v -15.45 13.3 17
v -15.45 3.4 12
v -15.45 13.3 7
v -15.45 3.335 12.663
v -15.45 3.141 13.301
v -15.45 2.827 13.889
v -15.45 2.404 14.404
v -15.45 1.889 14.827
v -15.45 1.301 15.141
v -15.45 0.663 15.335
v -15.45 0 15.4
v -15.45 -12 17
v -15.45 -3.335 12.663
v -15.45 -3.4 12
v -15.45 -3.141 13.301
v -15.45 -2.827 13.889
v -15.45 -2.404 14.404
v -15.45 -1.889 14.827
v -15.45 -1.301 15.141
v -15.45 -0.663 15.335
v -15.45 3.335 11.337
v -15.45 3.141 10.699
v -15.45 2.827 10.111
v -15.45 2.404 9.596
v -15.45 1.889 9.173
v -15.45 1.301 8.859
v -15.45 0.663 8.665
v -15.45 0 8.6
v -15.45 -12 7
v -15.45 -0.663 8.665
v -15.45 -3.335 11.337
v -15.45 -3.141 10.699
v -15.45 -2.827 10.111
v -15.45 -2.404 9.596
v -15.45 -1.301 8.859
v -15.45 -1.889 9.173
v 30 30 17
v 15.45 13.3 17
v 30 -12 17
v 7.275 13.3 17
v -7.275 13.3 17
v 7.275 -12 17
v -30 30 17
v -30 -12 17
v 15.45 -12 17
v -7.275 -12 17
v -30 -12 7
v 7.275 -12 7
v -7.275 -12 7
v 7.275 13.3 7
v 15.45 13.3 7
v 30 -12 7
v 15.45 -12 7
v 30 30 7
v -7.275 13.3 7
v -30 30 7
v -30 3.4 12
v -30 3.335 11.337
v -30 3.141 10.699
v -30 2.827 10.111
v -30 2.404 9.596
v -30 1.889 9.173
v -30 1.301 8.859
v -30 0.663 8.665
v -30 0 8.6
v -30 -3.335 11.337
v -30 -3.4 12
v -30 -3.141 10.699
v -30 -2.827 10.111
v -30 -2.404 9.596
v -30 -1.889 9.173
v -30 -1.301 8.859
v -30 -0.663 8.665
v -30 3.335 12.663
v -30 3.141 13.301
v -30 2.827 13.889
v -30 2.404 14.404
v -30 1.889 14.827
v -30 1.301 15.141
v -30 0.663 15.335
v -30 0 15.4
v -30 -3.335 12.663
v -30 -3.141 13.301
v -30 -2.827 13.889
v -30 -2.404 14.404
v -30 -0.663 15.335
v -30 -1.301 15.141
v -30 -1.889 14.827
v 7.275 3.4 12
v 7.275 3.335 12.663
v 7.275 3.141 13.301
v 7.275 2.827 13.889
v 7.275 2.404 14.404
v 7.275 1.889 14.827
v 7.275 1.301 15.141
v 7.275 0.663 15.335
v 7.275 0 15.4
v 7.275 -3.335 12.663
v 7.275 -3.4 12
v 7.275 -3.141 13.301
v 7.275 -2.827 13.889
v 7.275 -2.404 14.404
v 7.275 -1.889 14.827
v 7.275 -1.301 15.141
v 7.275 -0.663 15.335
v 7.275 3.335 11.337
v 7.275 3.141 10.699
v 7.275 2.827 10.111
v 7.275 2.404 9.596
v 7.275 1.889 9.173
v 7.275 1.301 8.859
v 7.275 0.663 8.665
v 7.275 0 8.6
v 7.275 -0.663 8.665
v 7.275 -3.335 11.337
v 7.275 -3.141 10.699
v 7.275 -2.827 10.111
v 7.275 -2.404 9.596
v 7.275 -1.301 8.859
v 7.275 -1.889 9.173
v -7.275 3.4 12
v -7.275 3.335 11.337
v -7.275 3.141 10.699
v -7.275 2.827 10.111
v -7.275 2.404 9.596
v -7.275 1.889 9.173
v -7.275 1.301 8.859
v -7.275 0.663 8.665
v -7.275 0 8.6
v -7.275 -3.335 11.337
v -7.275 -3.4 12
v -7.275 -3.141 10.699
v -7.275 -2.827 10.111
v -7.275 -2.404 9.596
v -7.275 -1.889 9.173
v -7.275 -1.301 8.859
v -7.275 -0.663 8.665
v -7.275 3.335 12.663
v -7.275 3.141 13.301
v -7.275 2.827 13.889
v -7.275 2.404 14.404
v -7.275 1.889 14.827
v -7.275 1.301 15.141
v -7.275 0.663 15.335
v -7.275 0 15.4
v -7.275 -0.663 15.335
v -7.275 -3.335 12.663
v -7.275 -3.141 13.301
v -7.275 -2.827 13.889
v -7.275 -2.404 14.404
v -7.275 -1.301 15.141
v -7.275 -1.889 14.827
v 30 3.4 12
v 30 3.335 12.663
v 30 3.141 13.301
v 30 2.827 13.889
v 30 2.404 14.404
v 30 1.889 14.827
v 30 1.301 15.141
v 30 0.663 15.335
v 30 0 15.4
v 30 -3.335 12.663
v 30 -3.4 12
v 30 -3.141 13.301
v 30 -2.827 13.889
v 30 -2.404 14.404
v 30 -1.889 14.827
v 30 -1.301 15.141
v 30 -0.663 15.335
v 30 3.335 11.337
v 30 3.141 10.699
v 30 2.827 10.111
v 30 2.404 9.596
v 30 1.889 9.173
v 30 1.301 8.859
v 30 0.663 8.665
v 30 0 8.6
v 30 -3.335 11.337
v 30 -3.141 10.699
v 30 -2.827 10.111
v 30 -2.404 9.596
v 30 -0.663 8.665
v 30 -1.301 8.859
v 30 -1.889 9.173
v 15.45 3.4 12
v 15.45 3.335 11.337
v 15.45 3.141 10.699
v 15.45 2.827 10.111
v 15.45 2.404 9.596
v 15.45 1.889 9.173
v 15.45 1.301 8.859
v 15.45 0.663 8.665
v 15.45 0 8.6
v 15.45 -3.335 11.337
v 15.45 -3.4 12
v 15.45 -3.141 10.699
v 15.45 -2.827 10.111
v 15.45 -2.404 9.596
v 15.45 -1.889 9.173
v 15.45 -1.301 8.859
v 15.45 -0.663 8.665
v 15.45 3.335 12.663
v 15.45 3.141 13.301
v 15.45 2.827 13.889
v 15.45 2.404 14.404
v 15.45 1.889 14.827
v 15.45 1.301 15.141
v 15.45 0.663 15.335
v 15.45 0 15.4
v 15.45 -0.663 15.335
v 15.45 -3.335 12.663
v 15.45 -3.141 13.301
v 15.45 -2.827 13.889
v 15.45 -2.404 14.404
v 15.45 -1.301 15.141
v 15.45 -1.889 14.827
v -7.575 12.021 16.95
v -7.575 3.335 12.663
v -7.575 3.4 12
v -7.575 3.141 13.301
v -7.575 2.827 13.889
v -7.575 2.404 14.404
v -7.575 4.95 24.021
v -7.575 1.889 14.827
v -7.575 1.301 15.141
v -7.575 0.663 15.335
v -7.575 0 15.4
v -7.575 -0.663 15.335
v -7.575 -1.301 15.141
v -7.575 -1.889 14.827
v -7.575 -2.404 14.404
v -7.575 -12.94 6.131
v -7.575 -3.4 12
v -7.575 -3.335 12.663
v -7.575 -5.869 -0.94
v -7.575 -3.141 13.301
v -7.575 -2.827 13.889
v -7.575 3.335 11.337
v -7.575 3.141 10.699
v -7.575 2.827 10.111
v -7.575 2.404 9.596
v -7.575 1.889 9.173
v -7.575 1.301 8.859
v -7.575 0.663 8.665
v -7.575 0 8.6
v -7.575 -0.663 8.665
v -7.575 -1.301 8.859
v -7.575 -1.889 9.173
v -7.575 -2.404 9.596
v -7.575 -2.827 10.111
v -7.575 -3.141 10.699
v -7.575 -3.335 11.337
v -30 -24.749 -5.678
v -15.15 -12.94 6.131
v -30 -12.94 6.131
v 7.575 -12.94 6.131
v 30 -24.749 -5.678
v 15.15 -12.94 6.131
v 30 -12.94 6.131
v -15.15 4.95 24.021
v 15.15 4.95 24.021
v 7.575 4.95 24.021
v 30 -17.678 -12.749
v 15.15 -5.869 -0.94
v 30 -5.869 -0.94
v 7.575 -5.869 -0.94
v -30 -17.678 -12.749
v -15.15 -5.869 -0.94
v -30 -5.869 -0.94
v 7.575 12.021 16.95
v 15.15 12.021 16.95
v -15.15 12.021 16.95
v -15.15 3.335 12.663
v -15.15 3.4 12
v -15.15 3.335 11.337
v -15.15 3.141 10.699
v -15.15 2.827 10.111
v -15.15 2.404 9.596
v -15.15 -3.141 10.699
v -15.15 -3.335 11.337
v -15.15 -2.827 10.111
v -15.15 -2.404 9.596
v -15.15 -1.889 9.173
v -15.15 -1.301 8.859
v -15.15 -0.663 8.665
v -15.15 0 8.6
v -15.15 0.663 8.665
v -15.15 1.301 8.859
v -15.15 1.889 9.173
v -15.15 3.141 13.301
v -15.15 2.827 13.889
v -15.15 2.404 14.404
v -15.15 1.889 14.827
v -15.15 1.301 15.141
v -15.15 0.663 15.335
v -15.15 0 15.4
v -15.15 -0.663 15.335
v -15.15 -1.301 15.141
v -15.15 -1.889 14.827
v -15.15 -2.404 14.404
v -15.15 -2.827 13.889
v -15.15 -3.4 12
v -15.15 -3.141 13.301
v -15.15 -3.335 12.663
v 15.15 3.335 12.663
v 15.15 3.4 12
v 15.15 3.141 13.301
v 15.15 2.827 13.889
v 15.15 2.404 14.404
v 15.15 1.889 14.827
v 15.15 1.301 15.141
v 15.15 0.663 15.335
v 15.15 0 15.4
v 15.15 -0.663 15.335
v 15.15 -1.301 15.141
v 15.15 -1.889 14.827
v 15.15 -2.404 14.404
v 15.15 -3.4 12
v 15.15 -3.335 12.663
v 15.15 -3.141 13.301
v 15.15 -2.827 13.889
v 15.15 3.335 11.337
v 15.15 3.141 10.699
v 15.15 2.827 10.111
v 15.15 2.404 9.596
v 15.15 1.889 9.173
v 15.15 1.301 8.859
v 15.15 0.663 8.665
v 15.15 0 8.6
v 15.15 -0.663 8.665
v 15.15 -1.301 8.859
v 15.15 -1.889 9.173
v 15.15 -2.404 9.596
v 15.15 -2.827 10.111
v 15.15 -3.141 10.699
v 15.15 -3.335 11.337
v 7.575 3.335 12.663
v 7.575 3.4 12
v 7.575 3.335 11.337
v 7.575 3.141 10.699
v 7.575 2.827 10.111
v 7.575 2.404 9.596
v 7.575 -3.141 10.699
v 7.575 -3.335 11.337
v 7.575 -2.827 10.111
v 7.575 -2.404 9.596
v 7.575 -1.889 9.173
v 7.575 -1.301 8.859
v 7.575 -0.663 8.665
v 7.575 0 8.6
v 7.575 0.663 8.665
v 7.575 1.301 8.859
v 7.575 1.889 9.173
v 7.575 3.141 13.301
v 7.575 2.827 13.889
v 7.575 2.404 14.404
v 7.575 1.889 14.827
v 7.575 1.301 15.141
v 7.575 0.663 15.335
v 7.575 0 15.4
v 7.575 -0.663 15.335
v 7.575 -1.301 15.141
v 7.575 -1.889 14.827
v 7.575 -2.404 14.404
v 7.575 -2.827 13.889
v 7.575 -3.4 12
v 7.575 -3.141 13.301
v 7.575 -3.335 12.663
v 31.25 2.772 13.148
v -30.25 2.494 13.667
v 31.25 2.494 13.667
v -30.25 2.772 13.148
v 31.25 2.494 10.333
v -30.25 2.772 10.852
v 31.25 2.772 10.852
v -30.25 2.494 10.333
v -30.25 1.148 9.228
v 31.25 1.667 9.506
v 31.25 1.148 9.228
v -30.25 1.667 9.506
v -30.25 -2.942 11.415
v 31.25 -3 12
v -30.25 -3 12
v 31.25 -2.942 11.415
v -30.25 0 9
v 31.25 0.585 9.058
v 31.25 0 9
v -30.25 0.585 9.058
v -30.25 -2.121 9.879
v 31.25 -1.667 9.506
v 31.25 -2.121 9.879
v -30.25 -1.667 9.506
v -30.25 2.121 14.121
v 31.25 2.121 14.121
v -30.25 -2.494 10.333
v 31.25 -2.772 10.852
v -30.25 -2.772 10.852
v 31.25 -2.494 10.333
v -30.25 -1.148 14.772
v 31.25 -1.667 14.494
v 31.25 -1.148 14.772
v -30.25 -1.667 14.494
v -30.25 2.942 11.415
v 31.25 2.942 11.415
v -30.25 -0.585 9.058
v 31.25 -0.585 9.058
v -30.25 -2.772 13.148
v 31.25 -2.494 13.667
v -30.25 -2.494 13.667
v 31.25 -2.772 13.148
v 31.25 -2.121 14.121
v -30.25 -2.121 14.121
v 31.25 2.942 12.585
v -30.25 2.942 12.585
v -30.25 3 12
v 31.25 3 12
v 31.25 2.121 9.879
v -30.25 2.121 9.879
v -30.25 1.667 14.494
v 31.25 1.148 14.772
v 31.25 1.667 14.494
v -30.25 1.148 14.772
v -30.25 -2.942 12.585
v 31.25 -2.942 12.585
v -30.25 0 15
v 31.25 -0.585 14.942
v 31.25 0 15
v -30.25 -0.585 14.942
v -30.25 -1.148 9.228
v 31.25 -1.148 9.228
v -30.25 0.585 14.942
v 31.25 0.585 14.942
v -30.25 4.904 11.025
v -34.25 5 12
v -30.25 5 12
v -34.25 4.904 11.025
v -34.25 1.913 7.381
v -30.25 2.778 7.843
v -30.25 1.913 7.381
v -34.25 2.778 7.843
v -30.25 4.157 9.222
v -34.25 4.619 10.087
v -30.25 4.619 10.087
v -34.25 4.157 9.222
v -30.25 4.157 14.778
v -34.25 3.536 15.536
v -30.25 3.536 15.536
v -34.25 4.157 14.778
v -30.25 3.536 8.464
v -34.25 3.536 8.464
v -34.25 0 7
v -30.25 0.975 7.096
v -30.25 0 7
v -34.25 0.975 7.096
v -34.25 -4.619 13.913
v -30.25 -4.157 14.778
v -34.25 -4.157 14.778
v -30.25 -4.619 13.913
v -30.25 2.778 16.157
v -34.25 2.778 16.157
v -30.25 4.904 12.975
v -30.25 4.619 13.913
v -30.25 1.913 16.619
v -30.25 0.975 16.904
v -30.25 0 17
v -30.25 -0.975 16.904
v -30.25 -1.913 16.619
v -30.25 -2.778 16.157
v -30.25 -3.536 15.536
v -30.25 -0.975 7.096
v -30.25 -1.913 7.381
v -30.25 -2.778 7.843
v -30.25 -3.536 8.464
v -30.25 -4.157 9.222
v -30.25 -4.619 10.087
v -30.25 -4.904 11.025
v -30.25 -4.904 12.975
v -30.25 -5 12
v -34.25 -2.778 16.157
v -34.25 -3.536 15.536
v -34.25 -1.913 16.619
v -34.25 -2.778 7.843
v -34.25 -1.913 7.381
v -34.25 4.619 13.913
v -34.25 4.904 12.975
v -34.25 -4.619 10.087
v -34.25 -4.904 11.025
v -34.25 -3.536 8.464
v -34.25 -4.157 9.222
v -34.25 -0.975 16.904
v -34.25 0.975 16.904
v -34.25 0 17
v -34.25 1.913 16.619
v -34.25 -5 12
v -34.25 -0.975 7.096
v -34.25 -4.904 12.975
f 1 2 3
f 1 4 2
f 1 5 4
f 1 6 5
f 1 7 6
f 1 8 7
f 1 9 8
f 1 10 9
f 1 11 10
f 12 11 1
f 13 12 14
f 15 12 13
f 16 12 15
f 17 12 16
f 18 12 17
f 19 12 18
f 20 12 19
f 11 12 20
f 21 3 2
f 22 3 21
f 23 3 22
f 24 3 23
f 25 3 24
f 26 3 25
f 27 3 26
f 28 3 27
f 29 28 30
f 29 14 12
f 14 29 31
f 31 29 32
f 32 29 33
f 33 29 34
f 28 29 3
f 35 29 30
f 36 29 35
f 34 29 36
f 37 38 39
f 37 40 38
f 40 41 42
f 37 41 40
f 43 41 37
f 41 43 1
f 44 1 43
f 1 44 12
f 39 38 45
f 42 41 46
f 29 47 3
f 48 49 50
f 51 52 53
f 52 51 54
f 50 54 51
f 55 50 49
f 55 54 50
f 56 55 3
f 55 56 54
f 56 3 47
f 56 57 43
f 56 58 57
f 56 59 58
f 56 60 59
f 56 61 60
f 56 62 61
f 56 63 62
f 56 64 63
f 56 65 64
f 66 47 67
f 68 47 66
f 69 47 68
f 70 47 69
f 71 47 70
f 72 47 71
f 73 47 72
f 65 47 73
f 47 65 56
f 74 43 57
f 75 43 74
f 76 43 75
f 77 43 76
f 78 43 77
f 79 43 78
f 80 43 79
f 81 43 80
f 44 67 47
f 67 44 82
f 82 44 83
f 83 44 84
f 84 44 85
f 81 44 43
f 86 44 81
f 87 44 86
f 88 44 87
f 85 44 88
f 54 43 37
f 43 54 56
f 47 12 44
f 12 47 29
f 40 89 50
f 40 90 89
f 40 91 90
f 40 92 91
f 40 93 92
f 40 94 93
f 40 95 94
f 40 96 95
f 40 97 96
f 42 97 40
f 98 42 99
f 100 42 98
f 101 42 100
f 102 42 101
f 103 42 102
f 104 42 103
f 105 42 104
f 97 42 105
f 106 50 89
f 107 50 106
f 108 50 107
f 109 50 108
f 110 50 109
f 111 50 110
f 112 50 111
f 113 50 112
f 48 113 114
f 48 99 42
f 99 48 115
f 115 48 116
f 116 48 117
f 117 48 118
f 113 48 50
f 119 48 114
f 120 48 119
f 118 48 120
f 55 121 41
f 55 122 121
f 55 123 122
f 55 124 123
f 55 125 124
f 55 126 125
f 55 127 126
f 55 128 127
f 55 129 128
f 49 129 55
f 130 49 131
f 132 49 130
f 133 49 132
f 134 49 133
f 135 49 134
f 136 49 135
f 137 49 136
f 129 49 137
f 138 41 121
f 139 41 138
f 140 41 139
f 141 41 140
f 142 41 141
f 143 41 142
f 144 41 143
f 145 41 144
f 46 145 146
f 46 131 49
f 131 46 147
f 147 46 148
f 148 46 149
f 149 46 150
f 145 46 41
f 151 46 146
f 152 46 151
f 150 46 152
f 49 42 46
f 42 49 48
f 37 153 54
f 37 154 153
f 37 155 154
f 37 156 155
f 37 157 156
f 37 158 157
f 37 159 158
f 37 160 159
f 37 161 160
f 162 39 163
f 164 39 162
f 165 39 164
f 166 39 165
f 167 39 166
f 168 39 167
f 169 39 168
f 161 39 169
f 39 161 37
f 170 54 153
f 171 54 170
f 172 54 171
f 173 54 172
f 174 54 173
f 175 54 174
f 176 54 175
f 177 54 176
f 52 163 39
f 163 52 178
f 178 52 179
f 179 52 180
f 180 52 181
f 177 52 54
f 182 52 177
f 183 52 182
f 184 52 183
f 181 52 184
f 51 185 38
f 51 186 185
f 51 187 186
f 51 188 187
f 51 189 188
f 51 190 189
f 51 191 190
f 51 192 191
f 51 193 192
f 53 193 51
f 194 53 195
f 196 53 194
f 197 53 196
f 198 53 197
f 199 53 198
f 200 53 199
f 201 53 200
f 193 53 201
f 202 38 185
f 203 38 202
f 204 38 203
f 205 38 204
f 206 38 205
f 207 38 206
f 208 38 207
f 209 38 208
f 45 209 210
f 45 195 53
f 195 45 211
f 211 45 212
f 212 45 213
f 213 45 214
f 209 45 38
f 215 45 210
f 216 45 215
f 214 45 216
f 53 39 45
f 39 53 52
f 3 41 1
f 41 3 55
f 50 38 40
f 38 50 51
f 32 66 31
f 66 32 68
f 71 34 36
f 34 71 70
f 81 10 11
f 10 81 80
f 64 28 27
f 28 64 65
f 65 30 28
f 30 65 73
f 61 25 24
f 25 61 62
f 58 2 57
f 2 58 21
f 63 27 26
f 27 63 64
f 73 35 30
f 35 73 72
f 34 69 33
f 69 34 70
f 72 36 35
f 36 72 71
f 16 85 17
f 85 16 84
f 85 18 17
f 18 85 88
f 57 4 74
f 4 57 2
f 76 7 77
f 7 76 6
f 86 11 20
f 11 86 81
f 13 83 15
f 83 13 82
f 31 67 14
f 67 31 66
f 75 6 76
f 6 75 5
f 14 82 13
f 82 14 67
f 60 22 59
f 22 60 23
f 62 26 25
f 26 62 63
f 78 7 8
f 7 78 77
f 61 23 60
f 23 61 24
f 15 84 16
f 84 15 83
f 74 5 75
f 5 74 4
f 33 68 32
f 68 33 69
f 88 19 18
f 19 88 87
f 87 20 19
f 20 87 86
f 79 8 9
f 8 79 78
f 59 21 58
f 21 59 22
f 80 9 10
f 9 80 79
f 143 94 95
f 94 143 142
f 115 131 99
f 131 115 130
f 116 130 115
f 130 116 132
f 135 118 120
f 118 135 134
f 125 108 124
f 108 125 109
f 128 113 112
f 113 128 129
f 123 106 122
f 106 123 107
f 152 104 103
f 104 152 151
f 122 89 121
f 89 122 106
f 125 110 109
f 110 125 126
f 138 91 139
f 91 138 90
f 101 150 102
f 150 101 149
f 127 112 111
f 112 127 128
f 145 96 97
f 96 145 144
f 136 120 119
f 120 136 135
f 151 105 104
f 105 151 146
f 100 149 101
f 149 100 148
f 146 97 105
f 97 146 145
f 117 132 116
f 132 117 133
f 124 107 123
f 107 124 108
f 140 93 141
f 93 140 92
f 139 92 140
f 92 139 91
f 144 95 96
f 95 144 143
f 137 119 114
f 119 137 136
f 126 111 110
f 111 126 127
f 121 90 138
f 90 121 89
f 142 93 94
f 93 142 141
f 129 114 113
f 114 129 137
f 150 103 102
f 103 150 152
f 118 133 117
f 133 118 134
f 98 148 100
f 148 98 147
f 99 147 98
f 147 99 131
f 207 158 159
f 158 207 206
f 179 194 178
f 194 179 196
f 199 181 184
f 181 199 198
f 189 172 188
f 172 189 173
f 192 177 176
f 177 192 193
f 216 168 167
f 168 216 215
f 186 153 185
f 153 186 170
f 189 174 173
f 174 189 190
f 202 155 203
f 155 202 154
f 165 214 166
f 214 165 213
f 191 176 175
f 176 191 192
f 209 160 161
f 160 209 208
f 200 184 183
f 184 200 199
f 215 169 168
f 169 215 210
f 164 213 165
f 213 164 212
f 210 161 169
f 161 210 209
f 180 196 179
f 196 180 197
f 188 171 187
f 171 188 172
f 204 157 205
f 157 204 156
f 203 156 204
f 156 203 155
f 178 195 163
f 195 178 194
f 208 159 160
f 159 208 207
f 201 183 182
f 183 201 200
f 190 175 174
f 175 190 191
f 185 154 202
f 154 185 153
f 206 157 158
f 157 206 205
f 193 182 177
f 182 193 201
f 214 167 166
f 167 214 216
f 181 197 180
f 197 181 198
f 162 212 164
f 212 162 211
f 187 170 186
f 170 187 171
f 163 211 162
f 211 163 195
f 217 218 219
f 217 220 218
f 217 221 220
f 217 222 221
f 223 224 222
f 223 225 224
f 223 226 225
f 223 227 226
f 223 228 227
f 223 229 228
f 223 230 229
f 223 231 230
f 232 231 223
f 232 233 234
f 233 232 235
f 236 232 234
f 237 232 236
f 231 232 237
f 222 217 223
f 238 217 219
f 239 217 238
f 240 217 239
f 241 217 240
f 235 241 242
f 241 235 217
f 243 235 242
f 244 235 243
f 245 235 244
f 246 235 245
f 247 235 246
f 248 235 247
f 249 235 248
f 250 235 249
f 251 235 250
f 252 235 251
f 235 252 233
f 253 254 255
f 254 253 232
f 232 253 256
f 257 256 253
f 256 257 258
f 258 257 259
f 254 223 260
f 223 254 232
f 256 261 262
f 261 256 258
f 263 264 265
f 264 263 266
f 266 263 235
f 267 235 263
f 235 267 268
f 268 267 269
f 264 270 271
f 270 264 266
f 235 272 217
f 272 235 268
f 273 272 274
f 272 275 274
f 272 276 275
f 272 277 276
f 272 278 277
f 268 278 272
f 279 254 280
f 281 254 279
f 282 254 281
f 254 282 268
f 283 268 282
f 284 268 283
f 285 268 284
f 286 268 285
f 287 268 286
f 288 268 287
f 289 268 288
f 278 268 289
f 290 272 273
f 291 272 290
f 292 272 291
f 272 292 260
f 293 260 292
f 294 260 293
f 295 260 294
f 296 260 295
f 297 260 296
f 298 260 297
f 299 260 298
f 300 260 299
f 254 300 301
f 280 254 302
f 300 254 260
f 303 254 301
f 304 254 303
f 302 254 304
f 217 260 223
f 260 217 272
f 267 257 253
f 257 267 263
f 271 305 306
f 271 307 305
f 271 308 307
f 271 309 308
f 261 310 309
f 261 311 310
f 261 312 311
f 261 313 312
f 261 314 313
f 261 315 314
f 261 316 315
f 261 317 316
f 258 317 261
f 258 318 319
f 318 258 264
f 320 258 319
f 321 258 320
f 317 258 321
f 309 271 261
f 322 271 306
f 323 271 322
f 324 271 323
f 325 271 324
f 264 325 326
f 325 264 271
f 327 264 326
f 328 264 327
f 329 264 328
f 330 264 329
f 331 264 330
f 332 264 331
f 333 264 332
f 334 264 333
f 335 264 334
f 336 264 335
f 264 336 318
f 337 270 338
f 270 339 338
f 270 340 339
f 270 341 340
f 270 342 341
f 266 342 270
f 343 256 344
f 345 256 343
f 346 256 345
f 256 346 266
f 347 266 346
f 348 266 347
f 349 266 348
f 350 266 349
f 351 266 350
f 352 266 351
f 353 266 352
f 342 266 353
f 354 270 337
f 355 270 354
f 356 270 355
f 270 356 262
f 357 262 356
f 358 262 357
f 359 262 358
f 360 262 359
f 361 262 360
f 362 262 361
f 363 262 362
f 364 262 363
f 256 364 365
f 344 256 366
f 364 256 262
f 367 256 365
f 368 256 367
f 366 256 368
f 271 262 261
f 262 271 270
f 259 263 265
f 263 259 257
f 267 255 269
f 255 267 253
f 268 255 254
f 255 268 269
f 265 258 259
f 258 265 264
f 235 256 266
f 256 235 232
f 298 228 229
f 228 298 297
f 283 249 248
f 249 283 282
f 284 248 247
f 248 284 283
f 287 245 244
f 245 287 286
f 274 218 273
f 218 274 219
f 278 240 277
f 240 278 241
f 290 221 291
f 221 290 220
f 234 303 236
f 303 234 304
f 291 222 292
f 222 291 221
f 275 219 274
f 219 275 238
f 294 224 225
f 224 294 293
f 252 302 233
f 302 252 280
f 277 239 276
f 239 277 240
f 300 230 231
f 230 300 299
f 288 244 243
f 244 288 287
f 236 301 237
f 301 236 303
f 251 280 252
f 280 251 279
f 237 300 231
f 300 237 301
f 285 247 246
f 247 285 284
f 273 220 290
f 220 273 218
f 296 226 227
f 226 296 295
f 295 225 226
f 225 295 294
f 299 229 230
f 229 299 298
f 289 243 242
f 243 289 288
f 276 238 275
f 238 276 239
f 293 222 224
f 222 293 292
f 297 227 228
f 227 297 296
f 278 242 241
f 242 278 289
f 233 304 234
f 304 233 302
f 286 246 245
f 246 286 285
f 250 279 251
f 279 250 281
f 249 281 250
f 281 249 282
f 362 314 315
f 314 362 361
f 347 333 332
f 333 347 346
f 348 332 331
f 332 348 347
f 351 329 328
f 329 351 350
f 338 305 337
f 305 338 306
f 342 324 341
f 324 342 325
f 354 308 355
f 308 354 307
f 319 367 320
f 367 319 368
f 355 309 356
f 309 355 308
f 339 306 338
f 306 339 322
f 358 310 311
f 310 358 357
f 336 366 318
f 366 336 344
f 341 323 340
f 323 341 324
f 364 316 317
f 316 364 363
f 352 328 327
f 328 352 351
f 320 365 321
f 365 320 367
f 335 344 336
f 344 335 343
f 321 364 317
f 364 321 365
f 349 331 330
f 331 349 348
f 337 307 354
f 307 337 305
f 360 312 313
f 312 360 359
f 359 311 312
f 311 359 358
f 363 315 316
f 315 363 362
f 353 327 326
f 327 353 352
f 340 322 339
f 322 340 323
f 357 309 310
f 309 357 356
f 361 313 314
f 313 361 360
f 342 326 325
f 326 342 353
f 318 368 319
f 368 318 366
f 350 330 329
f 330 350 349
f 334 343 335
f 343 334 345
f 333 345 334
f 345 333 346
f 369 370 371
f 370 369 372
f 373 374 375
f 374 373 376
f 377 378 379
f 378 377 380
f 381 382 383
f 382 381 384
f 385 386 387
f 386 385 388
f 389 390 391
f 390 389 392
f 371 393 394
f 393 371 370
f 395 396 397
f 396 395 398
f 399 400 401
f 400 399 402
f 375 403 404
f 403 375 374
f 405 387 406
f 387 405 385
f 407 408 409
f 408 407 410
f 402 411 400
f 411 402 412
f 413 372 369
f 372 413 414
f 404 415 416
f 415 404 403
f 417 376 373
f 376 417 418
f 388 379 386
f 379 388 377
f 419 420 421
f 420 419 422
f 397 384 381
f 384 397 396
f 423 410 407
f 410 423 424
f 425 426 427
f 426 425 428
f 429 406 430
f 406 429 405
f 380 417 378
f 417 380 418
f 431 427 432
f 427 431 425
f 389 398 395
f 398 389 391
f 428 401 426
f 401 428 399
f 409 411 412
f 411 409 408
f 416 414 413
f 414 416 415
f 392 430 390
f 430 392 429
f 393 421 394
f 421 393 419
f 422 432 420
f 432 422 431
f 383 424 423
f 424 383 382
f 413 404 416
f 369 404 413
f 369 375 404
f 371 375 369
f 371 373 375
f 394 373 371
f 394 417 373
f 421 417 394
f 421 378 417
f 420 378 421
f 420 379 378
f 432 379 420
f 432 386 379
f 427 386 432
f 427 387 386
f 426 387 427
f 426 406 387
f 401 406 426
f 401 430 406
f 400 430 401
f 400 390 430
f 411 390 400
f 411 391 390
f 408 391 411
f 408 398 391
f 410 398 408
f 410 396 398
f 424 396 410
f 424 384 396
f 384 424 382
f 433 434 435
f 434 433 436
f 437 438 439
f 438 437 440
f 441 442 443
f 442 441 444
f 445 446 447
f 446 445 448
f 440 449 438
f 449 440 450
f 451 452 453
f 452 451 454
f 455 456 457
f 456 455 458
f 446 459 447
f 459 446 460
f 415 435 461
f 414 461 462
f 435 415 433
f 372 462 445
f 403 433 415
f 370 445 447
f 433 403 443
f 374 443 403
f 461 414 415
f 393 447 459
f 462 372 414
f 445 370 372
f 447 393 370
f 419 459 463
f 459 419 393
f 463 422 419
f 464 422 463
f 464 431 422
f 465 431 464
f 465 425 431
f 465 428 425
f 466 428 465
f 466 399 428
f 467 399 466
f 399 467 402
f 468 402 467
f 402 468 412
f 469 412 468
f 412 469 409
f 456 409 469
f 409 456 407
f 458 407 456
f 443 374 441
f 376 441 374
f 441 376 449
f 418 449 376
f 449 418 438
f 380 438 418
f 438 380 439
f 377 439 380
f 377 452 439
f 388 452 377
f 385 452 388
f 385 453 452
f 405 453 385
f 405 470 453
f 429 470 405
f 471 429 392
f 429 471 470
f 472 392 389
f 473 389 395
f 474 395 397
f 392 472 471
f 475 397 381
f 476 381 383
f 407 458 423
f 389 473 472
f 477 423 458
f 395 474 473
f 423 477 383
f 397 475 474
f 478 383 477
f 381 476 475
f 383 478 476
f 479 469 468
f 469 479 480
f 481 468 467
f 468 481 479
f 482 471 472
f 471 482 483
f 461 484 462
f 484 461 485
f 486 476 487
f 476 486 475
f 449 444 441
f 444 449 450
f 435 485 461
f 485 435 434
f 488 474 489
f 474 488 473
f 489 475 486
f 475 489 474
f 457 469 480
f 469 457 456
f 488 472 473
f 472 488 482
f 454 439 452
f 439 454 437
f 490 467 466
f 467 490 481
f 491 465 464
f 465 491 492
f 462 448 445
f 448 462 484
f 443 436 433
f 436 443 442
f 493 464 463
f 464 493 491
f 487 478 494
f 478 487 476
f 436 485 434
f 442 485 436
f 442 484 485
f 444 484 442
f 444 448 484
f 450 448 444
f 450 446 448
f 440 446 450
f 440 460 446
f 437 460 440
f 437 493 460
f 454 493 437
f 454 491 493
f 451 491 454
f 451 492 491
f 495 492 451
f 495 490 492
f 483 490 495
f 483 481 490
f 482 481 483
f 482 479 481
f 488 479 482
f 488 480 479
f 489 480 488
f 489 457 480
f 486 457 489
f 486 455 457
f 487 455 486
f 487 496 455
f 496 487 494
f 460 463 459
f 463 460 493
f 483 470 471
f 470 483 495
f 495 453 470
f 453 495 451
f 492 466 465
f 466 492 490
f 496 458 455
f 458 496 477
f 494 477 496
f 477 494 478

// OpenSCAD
$fn = 32;

// ------------------------------------------------------------------------
// Butt hinge: hinge 60 mm, leaf swung 45 deg
// Every part is its own module, assembly() places every instance.
// ------------------------------------------------------------------------

// --- part 1 ---
module hinge_base() {
  difference() {
    union() {
      translate([-30, -12, -5]) cube([14.55, 42, 10]);
      translate([-7.275, -12, -5]) cube([14.55, 42, 10]);
      translate([15.45, -12, -5]) cube([14.55, 42, 10]);
      translate([-30, 13.3, -5]) cube([60, 16.7, 10]);
    }
    translate([-22.725, 0, 0]) rotate([0, 90, 0]) cylinder(h = 16.55, d = 6.8, center = true);
    translate([0, 0, 0]) rotate([0, 90, 0]) cylinder(h = 16.55, d = 6.8, center = true);
    translate([22.725, 0, 0]) rotate([0, 90, 0]) cylinder(h = 16.55, d = 6.8, center = true);
  }
}

// --- part 2 ---
module hinge_mover() {
  difference() {
    union() {
      translate([-15.15, -30, -5]) cube([7.575, 42, 10]);
      translate([7.575, -30, -5]) cube([7.575, 42, 10]);
      translate([-30, -30, -5]) cube([60, 16.7, 10]);
    }
    translate([-11.362, 0, 0]) rotate([0, 90, 0]) cylinder(h = 9.575, d = 6.8, center = true);
    translate([11.362, 0, 0]) rotate([0, 90, 0]) cylinder(h = 9.575, d = 6.8, center = true);
  }
}

// --- part 3 ---
module hinge_pin() {
  rotate([0, 90, 0]) cylinder(h = 62.5, d = 6, center = true);
  translate([-34.25, 0, 0]) rotate([0, 90, 0]) cylinder(h = 4, d = 10);
}

// --- assembly ---
module assembly() {
  color([0.80, 0.24, 0.20]) translate([0, 0, 12]) rotate([0, 0, 0]) hinge_base();
  color([0.20, 0.45, 0.75]) translate([0, 0, 12]) rotate([45, 0, 0]) hinge_mover();
  color([0.25, 0.62, 0.32]) translate([0, 0, 12]) rotate([0, 0, 0]) hinge_pin();
}

assembly();
